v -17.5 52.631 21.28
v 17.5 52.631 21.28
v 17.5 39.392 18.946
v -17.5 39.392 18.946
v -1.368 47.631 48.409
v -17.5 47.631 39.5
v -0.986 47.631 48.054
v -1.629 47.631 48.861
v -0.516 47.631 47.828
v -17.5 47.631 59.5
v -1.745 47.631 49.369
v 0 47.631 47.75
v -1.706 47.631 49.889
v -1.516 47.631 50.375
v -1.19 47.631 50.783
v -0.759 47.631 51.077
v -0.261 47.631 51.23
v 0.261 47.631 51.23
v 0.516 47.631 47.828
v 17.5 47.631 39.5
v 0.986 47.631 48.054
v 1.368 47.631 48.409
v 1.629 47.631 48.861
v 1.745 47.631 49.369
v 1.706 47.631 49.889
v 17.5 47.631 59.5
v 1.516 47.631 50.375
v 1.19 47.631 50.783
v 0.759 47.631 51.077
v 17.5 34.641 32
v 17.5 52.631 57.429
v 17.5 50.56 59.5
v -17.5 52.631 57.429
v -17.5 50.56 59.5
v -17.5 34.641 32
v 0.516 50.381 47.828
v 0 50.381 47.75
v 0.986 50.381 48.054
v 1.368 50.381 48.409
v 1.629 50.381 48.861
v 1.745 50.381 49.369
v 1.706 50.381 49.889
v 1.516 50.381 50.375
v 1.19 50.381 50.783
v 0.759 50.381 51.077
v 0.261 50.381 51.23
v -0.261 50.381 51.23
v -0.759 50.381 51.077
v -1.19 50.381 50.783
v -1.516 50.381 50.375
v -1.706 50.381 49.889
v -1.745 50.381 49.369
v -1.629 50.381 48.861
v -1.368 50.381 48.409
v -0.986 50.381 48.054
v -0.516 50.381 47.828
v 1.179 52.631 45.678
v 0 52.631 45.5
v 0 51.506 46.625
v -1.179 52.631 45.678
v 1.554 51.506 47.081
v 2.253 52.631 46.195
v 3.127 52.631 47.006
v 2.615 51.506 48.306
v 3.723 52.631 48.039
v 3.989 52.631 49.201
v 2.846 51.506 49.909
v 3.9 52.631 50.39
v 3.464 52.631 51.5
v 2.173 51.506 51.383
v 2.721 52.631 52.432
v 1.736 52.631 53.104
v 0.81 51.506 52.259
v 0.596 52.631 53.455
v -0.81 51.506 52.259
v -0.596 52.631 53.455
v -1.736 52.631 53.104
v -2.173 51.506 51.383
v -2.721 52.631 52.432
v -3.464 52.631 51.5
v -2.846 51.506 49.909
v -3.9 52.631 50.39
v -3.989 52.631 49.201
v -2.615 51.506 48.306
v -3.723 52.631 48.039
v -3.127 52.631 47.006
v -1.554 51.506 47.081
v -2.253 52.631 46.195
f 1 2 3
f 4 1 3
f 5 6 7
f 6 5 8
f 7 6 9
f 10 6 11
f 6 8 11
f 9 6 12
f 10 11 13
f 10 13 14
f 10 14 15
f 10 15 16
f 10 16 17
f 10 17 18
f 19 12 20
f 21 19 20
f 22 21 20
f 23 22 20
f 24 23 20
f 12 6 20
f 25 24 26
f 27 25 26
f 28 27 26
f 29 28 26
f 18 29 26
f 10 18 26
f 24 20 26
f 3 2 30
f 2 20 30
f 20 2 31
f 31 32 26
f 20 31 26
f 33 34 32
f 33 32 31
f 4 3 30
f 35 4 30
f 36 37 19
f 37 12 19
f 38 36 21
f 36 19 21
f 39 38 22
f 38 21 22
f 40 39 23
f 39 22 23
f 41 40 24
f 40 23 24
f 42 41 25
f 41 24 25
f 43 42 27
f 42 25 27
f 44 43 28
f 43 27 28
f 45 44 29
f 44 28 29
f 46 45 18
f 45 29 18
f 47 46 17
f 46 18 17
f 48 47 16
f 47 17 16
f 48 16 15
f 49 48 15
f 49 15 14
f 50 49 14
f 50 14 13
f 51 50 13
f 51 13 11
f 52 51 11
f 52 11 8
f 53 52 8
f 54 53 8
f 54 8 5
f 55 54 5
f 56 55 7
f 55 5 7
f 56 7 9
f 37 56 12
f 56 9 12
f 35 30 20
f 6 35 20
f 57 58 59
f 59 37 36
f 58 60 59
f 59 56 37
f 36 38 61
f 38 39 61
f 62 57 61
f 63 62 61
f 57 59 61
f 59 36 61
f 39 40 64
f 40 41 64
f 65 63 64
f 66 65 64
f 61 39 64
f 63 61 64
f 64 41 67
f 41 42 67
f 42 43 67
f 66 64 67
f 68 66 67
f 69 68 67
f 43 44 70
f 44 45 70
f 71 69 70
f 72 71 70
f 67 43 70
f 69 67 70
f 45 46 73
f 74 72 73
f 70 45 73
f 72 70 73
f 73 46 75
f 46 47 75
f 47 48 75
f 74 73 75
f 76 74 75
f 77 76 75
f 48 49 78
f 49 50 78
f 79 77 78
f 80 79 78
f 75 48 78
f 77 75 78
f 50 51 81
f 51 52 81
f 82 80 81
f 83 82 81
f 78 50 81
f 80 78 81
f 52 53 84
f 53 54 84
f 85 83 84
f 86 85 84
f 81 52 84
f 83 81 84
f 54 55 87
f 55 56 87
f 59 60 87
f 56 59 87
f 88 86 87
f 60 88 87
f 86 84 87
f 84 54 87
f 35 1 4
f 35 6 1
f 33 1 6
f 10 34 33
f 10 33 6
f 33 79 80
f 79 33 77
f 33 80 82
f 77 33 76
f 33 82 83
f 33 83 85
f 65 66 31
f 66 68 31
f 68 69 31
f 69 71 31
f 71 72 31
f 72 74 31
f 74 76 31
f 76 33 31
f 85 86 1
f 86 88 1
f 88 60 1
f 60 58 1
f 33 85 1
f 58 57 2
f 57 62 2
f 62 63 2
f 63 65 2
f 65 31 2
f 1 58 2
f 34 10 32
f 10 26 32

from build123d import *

# Parameters (mm, degrees)
PAD_DEPTH        = 17.5
HOLE_D           = 3.5
HOLE_CSINK_D     = 8
HOLE_CSINK_ANGLE = 90


with BuildPart() as part:
    # Sketch → Pad (new body, symmetric)
    with BuildSketch(Plane.YZ):
        Polygon((34.641016, 32), (47.631397, 39.5), (47.631397, 59.5), (50.560329, 59.5), (52.631397, 57.428932), (52.631397, 21.280335), (39.39231, 18.945927), align=None)
    extrude(amount=PAD_DEPTH, both=True)

    # Hole (through all)
    with Locations(Plane.ZX.offset(52.631397)):
        with Locations((49.5, 0)):
            CounterSinkHole(HOLE_D / 2, HOLE_CSINK_D / 2, counter_sink_angle=HOLE_CSINK_ANGLE)


solid = part.part
